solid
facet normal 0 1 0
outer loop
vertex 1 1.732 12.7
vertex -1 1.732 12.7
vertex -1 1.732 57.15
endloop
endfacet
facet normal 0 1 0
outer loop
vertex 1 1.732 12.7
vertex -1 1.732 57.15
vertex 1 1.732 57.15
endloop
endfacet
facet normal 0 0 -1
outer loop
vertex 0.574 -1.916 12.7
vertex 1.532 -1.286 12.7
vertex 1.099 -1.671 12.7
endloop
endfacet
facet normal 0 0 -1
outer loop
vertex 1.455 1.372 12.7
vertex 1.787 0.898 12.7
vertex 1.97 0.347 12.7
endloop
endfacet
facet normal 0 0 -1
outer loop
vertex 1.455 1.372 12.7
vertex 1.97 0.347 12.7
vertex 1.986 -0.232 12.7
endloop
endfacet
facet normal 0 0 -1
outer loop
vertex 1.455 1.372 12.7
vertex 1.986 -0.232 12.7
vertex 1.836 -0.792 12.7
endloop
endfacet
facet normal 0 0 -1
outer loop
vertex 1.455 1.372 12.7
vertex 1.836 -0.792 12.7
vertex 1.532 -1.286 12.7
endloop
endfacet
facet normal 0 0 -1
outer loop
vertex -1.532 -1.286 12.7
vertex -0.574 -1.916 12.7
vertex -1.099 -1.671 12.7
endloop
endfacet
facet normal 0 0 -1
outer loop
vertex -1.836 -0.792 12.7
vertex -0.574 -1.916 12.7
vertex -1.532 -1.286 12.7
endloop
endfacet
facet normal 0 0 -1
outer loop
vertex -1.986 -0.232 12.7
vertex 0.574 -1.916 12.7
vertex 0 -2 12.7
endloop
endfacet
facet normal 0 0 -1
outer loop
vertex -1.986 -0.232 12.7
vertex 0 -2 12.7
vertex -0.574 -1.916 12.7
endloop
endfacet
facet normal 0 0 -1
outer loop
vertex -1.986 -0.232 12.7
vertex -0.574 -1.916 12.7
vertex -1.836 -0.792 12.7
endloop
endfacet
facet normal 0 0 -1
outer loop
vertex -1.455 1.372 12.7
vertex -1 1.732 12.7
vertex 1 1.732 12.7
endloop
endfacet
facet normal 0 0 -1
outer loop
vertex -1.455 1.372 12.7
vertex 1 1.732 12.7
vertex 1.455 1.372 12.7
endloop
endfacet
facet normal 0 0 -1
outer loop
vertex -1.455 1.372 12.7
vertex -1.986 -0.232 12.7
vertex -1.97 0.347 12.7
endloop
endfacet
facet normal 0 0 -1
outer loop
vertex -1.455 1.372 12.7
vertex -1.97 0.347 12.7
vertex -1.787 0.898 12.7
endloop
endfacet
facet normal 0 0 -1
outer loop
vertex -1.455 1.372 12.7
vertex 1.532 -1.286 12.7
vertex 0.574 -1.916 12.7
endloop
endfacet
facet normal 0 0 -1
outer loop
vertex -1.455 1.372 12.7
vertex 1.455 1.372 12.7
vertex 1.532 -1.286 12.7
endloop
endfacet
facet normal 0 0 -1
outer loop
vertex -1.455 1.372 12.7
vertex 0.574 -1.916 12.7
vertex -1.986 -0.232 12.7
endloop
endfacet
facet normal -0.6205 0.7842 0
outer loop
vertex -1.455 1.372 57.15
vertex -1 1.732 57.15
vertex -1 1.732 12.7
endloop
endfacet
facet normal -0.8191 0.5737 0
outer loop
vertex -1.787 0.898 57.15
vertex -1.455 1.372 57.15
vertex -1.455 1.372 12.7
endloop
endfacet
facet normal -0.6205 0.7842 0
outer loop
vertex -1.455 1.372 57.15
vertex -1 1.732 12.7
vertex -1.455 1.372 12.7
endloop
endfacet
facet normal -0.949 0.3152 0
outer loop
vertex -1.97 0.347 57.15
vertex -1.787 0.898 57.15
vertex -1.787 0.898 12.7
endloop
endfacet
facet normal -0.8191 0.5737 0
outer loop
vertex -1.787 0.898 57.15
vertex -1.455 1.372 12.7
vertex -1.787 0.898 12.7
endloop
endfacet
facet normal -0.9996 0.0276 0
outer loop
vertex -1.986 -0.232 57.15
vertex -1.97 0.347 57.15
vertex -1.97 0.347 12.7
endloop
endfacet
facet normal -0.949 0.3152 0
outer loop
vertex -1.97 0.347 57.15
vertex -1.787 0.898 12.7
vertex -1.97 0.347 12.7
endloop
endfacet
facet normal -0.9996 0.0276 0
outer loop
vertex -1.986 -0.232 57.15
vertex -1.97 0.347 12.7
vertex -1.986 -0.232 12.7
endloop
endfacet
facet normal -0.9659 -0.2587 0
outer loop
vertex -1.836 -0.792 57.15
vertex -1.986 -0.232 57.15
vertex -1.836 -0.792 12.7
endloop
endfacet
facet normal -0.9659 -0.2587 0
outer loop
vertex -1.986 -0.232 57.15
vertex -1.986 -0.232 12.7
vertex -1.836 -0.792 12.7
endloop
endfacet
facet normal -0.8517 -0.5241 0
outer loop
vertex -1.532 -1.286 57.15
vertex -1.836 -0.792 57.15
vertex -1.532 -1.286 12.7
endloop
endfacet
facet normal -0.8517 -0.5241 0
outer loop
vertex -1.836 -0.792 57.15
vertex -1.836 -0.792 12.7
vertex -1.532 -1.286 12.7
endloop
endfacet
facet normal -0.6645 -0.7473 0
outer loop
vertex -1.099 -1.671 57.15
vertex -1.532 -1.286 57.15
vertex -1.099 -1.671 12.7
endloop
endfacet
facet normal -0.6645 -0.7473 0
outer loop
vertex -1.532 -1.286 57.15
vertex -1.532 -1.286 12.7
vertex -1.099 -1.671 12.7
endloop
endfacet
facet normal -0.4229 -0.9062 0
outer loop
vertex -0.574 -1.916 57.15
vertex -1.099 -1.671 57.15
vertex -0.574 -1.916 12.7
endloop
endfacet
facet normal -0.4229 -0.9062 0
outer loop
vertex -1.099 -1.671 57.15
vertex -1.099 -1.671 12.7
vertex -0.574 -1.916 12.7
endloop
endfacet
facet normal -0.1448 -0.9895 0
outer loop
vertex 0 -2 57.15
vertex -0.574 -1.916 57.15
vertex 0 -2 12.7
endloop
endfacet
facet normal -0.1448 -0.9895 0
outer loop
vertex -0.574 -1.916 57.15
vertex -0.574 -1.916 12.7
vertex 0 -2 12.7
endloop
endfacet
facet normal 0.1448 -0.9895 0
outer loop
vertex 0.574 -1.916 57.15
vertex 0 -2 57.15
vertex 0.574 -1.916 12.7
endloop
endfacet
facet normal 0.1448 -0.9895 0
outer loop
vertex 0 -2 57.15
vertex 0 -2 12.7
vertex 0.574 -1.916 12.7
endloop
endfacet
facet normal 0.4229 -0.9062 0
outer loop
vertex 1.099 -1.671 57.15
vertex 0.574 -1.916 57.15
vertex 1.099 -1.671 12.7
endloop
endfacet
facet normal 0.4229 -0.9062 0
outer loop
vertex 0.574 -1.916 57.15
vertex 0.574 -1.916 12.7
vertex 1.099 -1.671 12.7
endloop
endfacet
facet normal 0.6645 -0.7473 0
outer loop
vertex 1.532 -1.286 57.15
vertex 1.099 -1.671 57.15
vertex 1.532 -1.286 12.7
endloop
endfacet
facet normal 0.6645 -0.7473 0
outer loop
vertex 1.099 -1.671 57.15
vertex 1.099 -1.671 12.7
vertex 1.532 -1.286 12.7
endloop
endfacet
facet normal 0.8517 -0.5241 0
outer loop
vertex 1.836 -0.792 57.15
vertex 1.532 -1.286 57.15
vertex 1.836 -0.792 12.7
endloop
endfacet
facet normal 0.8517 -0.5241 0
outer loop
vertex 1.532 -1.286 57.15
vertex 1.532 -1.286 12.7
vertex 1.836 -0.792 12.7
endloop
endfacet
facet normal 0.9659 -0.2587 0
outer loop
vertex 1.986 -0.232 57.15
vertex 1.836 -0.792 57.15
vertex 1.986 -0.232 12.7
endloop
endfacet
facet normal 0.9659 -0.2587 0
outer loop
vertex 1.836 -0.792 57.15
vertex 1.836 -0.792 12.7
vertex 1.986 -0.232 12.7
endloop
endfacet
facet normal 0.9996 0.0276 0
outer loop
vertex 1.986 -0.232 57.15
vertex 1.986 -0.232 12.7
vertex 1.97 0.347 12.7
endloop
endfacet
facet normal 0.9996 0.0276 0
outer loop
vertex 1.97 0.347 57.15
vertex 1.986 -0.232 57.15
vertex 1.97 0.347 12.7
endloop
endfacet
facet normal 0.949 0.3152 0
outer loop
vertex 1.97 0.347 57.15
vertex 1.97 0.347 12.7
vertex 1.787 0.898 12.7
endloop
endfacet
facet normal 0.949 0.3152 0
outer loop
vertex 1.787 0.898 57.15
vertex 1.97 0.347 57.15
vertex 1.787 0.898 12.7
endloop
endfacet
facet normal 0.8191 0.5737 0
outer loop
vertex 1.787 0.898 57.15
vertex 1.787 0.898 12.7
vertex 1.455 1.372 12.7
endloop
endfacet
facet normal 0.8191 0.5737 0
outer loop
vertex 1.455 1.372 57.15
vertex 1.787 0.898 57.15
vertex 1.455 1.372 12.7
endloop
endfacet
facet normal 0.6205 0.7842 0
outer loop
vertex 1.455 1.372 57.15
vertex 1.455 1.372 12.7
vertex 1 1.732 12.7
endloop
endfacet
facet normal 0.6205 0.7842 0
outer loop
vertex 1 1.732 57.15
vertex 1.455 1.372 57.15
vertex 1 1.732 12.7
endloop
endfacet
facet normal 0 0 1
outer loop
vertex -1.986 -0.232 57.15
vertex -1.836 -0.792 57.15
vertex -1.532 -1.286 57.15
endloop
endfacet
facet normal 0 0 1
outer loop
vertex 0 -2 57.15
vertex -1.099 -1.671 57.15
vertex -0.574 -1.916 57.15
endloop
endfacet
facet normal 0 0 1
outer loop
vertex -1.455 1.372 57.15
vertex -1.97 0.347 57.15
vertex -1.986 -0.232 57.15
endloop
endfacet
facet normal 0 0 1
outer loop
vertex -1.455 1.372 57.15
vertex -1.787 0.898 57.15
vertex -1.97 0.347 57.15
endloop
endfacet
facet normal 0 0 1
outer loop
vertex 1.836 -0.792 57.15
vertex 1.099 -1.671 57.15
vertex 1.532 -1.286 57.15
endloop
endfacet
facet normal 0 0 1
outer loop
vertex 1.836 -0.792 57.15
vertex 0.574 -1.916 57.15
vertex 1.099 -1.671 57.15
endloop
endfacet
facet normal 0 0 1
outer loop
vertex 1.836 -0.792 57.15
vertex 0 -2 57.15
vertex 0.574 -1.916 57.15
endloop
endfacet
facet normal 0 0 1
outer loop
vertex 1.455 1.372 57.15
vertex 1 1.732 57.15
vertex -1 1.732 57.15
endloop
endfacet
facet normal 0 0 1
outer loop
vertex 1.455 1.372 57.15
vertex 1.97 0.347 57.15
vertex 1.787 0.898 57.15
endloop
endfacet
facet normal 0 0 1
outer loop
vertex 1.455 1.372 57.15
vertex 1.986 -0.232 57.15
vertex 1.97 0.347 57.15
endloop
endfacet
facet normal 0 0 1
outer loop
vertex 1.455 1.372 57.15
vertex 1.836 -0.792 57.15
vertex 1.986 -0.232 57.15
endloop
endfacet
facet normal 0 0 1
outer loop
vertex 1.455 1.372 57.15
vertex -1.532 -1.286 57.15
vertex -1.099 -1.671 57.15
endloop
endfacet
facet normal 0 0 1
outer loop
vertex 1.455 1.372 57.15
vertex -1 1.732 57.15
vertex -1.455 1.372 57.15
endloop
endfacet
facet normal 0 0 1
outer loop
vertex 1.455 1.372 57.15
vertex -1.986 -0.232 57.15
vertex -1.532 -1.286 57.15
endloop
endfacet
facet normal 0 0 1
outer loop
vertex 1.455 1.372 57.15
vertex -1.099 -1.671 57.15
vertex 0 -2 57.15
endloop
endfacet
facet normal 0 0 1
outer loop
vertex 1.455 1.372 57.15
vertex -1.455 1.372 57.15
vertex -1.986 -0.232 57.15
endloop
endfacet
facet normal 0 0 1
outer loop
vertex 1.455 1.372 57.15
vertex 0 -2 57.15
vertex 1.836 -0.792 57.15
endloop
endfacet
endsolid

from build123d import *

# Parameters (mm, degrees)
SKETCH3_R               = 2
BOSS_EXTRUDE2_DEPTH     = 76.2
CUT_EXTRUDE5_DEPTH      = 77.25247537
CUT_EXTRUDE5_DEPTH_BACK = 77.25247537
CHAMFER1_SIZE           = 0.2
SKETCH11_R              = 3.175
CUT_EXTRUDE6_DEPTH      = 12.7
CUT_EXTRUDE7_START      = -19.05
SKETCH12_R              = 2
CUT_EXTRUDE7_DEPTH      = 19.05


with BuildPart() as part:
    # Sketch3 → Boss-Extrude2 (new body)
    with BuildSketch(Plane.XY):
        with Locations(Location((0, 0, 0), (0, 0, 180))):
            Circle(SKETCH3_R)
    extrude(amount=BOSS_EXTRUDE2_DEPTH)

    # Sketch10 → Cut-Extrude5 (cut, two sides: drawn at the far end of the back side and taken through both)
    with BuildSketch(Plane.XY.offset(-CUT_EXTRUDE5_DEPTH_BACK)):
        with BuildLine():
            Line((-1, 1.732050808), (1, 1.732050808))
            ThreePointArc((1, 1.732050808), (0, 2), (-1, 1.732050808))
        make_face()
    extrude(amount=CUT_EXTRUDE5_DEPTH + CUT_EXTRUDE5_DEPTH_BACK, mode=Mode.SUBTRACT)

    # Chamfer1
    chamfer1_edges = [part.edges().sort_by_distance(p)[0] for p in [
        (0, -2, 0),
        (0, -2, 76.2),
    ]]
    chamfer(chamfer1_edges, length=CHAMFER1_SIZE)

    # Sketch11 → Cut-Extrude6 (cut)
    with BuildSketch(Plane(origin=(0, 0, 0), x_dir=(-1, 0, 0), z_dir=(0, 0, -1))):
        Circle(SKETCH11_R)
    extrude(amount=-CUT_EXTRUDE6_DEPTH, mode=Mode.SUBTRACT)

    # Sketch12 → Cut-Extrude7 (cut)
    with BuildSketch(Plane.XY.offset(76.2).offset(CUT_EXTRUDE7_START)):
        Circle(SKETCH12_R)
    extrude(amount=CUT_EXTRUDE7_DEPTH, mode=Mode.SUBTRACT)


solid = part.part
